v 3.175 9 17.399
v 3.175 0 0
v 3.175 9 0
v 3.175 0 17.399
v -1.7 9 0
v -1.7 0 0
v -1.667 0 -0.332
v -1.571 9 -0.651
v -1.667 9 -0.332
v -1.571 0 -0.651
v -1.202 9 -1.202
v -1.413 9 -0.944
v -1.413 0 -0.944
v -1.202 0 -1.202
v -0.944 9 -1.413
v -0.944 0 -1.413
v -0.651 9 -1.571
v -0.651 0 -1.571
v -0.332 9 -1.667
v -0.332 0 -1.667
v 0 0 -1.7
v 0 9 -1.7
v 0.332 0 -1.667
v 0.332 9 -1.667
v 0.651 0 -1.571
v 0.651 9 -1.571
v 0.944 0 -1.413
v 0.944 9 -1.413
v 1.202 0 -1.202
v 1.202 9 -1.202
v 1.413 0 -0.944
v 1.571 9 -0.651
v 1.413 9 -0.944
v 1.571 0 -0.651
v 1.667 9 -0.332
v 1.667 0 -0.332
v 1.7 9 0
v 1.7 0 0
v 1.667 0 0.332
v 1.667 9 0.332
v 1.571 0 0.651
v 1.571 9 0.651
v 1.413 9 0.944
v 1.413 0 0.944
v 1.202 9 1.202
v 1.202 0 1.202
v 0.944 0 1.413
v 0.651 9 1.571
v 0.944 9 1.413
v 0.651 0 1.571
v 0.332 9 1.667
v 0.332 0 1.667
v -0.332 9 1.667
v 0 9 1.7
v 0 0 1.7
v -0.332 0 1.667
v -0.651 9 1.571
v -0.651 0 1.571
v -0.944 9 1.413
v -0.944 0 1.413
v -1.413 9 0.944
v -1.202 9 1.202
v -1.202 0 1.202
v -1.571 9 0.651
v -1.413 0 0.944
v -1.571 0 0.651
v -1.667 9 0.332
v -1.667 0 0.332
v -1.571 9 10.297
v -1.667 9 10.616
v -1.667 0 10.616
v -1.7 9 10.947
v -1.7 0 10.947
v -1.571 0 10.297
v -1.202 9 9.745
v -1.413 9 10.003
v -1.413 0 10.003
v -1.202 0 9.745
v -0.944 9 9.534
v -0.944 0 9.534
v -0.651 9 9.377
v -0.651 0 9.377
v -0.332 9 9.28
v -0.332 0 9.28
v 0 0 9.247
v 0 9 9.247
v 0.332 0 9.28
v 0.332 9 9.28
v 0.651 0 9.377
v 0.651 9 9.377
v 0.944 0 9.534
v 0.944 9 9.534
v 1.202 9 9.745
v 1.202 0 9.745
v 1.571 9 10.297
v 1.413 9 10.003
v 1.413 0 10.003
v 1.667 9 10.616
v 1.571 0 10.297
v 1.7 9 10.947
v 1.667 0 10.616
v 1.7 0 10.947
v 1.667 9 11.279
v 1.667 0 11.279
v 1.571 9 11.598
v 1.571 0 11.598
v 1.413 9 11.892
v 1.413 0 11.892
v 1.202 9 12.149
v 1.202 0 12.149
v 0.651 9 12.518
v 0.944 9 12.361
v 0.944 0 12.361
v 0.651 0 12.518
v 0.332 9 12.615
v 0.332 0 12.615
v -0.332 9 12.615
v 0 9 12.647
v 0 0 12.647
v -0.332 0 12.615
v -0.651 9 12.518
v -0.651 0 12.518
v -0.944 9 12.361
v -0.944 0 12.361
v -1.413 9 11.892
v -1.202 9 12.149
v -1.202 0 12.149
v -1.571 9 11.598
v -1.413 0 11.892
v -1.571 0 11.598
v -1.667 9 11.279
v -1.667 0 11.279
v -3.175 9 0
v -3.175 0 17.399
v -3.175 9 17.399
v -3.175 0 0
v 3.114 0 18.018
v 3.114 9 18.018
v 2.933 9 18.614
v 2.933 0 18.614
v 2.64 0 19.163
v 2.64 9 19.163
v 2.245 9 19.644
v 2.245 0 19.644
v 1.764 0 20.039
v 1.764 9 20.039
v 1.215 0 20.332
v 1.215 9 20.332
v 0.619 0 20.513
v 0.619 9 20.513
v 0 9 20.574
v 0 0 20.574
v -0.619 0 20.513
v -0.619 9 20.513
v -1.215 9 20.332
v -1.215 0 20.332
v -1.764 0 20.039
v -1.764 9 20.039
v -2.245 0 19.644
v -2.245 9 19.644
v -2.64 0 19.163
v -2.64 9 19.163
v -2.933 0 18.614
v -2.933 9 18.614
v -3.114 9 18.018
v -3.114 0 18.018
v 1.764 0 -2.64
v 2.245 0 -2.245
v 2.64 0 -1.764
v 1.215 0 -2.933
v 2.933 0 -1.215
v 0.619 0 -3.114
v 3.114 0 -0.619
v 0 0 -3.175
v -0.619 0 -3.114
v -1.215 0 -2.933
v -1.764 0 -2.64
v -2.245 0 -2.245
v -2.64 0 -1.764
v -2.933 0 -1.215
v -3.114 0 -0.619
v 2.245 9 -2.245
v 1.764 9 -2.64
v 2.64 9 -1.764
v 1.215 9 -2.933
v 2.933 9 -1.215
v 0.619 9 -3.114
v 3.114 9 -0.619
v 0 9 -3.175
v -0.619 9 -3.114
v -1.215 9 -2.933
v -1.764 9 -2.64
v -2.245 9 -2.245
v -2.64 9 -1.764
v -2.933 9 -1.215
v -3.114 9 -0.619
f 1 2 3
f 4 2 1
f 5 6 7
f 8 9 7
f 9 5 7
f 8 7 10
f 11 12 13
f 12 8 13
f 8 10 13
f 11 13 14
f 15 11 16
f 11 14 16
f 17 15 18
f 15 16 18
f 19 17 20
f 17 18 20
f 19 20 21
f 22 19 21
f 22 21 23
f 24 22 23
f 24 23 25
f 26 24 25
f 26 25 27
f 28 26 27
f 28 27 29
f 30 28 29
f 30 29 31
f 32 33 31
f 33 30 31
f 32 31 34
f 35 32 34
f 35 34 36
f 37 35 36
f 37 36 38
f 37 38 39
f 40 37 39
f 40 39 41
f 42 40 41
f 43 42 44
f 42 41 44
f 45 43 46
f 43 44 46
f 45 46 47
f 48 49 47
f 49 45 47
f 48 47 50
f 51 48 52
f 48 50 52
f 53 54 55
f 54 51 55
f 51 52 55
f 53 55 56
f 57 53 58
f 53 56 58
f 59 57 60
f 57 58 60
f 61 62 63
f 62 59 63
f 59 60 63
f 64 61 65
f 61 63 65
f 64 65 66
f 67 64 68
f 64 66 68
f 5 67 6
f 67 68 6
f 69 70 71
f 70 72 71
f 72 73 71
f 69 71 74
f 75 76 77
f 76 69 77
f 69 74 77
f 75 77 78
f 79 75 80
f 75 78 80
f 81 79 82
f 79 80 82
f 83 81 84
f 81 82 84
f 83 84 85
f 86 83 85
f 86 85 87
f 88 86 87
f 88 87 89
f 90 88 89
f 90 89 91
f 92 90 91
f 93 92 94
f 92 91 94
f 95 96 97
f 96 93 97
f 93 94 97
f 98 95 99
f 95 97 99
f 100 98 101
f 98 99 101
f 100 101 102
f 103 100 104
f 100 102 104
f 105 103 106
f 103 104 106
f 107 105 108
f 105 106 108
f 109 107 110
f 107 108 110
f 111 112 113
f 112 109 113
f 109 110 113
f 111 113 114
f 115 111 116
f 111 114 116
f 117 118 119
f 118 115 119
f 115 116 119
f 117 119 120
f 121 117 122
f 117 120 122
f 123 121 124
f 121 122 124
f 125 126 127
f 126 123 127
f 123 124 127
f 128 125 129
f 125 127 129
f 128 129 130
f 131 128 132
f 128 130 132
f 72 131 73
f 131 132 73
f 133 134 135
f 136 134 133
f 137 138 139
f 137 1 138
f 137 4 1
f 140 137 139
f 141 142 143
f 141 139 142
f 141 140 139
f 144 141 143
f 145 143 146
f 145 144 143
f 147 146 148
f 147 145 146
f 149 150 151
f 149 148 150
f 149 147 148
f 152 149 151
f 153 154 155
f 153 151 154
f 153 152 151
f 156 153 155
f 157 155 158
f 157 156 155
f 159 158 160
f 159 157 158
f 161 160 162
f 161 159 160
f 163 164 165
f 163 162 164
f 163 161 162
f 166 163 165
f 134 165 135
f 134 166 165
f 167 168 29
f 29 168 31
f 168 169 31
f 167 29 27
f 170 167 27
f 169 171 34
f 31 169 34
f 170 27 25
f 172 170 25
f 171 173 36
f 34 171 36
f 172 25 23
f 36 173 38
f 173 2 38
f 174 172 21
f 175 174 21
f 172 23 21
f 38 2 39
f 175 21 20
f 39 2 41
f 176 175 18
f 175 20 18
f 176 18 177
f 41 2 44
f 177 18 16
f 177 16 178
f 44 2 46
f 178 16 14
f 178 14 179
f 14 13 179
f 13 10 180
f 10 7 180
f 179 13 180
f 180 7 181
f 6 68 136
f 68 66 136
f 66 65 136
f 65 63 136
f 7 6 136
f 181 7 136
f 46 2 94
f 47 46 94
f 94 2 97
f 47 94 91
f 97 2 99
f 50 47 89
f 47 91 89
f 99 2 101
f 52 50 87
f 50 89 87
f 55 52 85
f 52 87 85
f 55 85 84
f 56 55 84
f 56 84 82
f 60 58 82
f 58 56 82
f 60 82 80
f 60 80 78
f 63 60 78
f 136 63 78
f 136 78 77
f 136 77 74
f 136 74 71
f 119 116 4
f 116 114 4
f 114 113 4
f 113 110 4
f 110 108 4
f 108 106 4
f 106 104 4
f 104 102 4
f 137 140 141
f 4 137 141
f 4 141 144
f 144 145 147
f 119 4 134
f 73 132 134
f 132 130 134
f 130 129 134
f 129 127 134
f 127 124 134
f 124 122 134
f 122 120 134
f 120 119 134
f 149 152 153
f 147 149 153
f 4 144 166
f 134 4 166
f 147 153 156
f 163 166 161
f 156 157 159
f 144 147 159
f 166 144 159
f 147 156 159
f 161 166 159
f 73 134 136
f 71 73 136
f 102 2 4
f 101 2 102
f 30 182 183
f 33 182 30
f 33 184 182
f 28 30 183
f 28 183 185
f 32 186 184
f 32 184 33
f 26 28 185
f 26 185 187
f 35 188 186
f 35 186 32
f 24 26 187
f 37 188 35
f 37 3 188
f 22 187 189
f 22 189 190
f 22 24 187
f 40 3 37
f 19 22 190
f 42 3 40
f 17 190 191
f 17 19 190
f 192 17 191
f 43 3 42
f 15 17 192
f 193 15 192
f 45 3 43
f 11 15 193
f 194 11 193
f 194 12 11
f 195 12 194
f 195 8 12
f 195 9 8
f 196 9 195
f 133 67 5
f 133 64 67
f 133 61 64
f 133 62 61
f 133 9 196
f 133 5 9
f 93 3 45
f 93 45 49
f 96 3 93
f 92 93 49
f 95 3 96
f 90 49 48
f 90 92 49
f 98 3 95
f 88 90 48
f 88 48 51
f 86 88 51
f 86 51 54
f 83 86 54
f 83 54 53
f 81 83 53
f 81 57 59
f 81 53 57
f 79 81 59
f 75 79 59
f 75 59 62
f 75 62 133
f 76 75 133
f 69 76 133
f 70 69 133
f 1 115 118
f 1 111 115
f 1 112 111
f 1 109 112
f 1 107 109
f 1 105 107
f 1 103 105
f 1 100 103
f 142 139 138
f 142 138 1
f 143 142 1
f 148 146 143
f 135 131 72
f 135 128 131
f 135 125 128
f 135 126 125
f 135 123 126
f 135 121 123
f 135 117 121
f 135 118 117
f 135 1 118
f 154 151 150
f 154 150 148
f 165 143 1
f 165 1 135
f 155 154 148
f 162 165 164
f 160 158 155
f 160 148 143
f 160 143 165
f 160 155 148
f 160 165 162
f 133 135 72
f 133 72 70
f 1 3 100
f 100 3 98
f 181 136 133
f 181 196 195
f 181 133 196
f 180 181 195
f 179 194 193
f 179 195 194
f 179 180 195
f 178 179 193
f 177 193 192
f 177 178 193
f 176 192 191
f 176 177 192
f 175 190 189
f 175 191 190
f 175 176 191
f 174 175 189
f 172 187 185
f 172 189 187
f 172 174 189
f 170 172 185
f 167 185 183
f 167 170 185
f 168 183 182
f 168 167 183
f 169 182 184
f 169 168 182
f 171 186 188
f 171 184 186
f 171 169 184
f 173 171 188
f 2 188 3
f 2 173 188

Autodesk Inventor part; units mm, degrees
ref_plane "YZ Plane" through (0, 0, 0) normal (1, 0, 0) x (0, 1, 0)
ref_plane "XZ Plane" through (0, 0, 0) normal (0, 1, 0) x (-1, 0, 0)
ref_plane "XY Plane" through (0, 0, 0) normal (0, 0, 1) x (1, 0, 0)
sketch "Sketch1" plane through (0, 0, 0) normal (0, 1, 0) x (-1, 0, 0)
  circle A0 centre (0, 0) radius 1.7
  arc A1 (-3.175, 0) -> (3.175, 0) centre (0, 0) ccw
  line L0 (-3.175, 0) -> (-3.175, 17.399)
  line L1 (3.175, 17.399) -> (3.175, 0)
  arc A2 (3.175, 17.399) -> (-3.175, 17.399) centre (0, 17.399) ccw
  circle A3 centre (0, 10.9474) radius 1.7
  dimension "d0" = 3.4
  dimension "d1" = 6.35
  dimension "d6" = 6.35
  dimension "d8" = 17.399
  dimension "d9" = 3.4
  dimension "d10" = 10.9474
extrude "Extrusion1" add sketch "Sketch1" along normal blind 9
properties part number "Limit switch trigger spacer extension arm"
